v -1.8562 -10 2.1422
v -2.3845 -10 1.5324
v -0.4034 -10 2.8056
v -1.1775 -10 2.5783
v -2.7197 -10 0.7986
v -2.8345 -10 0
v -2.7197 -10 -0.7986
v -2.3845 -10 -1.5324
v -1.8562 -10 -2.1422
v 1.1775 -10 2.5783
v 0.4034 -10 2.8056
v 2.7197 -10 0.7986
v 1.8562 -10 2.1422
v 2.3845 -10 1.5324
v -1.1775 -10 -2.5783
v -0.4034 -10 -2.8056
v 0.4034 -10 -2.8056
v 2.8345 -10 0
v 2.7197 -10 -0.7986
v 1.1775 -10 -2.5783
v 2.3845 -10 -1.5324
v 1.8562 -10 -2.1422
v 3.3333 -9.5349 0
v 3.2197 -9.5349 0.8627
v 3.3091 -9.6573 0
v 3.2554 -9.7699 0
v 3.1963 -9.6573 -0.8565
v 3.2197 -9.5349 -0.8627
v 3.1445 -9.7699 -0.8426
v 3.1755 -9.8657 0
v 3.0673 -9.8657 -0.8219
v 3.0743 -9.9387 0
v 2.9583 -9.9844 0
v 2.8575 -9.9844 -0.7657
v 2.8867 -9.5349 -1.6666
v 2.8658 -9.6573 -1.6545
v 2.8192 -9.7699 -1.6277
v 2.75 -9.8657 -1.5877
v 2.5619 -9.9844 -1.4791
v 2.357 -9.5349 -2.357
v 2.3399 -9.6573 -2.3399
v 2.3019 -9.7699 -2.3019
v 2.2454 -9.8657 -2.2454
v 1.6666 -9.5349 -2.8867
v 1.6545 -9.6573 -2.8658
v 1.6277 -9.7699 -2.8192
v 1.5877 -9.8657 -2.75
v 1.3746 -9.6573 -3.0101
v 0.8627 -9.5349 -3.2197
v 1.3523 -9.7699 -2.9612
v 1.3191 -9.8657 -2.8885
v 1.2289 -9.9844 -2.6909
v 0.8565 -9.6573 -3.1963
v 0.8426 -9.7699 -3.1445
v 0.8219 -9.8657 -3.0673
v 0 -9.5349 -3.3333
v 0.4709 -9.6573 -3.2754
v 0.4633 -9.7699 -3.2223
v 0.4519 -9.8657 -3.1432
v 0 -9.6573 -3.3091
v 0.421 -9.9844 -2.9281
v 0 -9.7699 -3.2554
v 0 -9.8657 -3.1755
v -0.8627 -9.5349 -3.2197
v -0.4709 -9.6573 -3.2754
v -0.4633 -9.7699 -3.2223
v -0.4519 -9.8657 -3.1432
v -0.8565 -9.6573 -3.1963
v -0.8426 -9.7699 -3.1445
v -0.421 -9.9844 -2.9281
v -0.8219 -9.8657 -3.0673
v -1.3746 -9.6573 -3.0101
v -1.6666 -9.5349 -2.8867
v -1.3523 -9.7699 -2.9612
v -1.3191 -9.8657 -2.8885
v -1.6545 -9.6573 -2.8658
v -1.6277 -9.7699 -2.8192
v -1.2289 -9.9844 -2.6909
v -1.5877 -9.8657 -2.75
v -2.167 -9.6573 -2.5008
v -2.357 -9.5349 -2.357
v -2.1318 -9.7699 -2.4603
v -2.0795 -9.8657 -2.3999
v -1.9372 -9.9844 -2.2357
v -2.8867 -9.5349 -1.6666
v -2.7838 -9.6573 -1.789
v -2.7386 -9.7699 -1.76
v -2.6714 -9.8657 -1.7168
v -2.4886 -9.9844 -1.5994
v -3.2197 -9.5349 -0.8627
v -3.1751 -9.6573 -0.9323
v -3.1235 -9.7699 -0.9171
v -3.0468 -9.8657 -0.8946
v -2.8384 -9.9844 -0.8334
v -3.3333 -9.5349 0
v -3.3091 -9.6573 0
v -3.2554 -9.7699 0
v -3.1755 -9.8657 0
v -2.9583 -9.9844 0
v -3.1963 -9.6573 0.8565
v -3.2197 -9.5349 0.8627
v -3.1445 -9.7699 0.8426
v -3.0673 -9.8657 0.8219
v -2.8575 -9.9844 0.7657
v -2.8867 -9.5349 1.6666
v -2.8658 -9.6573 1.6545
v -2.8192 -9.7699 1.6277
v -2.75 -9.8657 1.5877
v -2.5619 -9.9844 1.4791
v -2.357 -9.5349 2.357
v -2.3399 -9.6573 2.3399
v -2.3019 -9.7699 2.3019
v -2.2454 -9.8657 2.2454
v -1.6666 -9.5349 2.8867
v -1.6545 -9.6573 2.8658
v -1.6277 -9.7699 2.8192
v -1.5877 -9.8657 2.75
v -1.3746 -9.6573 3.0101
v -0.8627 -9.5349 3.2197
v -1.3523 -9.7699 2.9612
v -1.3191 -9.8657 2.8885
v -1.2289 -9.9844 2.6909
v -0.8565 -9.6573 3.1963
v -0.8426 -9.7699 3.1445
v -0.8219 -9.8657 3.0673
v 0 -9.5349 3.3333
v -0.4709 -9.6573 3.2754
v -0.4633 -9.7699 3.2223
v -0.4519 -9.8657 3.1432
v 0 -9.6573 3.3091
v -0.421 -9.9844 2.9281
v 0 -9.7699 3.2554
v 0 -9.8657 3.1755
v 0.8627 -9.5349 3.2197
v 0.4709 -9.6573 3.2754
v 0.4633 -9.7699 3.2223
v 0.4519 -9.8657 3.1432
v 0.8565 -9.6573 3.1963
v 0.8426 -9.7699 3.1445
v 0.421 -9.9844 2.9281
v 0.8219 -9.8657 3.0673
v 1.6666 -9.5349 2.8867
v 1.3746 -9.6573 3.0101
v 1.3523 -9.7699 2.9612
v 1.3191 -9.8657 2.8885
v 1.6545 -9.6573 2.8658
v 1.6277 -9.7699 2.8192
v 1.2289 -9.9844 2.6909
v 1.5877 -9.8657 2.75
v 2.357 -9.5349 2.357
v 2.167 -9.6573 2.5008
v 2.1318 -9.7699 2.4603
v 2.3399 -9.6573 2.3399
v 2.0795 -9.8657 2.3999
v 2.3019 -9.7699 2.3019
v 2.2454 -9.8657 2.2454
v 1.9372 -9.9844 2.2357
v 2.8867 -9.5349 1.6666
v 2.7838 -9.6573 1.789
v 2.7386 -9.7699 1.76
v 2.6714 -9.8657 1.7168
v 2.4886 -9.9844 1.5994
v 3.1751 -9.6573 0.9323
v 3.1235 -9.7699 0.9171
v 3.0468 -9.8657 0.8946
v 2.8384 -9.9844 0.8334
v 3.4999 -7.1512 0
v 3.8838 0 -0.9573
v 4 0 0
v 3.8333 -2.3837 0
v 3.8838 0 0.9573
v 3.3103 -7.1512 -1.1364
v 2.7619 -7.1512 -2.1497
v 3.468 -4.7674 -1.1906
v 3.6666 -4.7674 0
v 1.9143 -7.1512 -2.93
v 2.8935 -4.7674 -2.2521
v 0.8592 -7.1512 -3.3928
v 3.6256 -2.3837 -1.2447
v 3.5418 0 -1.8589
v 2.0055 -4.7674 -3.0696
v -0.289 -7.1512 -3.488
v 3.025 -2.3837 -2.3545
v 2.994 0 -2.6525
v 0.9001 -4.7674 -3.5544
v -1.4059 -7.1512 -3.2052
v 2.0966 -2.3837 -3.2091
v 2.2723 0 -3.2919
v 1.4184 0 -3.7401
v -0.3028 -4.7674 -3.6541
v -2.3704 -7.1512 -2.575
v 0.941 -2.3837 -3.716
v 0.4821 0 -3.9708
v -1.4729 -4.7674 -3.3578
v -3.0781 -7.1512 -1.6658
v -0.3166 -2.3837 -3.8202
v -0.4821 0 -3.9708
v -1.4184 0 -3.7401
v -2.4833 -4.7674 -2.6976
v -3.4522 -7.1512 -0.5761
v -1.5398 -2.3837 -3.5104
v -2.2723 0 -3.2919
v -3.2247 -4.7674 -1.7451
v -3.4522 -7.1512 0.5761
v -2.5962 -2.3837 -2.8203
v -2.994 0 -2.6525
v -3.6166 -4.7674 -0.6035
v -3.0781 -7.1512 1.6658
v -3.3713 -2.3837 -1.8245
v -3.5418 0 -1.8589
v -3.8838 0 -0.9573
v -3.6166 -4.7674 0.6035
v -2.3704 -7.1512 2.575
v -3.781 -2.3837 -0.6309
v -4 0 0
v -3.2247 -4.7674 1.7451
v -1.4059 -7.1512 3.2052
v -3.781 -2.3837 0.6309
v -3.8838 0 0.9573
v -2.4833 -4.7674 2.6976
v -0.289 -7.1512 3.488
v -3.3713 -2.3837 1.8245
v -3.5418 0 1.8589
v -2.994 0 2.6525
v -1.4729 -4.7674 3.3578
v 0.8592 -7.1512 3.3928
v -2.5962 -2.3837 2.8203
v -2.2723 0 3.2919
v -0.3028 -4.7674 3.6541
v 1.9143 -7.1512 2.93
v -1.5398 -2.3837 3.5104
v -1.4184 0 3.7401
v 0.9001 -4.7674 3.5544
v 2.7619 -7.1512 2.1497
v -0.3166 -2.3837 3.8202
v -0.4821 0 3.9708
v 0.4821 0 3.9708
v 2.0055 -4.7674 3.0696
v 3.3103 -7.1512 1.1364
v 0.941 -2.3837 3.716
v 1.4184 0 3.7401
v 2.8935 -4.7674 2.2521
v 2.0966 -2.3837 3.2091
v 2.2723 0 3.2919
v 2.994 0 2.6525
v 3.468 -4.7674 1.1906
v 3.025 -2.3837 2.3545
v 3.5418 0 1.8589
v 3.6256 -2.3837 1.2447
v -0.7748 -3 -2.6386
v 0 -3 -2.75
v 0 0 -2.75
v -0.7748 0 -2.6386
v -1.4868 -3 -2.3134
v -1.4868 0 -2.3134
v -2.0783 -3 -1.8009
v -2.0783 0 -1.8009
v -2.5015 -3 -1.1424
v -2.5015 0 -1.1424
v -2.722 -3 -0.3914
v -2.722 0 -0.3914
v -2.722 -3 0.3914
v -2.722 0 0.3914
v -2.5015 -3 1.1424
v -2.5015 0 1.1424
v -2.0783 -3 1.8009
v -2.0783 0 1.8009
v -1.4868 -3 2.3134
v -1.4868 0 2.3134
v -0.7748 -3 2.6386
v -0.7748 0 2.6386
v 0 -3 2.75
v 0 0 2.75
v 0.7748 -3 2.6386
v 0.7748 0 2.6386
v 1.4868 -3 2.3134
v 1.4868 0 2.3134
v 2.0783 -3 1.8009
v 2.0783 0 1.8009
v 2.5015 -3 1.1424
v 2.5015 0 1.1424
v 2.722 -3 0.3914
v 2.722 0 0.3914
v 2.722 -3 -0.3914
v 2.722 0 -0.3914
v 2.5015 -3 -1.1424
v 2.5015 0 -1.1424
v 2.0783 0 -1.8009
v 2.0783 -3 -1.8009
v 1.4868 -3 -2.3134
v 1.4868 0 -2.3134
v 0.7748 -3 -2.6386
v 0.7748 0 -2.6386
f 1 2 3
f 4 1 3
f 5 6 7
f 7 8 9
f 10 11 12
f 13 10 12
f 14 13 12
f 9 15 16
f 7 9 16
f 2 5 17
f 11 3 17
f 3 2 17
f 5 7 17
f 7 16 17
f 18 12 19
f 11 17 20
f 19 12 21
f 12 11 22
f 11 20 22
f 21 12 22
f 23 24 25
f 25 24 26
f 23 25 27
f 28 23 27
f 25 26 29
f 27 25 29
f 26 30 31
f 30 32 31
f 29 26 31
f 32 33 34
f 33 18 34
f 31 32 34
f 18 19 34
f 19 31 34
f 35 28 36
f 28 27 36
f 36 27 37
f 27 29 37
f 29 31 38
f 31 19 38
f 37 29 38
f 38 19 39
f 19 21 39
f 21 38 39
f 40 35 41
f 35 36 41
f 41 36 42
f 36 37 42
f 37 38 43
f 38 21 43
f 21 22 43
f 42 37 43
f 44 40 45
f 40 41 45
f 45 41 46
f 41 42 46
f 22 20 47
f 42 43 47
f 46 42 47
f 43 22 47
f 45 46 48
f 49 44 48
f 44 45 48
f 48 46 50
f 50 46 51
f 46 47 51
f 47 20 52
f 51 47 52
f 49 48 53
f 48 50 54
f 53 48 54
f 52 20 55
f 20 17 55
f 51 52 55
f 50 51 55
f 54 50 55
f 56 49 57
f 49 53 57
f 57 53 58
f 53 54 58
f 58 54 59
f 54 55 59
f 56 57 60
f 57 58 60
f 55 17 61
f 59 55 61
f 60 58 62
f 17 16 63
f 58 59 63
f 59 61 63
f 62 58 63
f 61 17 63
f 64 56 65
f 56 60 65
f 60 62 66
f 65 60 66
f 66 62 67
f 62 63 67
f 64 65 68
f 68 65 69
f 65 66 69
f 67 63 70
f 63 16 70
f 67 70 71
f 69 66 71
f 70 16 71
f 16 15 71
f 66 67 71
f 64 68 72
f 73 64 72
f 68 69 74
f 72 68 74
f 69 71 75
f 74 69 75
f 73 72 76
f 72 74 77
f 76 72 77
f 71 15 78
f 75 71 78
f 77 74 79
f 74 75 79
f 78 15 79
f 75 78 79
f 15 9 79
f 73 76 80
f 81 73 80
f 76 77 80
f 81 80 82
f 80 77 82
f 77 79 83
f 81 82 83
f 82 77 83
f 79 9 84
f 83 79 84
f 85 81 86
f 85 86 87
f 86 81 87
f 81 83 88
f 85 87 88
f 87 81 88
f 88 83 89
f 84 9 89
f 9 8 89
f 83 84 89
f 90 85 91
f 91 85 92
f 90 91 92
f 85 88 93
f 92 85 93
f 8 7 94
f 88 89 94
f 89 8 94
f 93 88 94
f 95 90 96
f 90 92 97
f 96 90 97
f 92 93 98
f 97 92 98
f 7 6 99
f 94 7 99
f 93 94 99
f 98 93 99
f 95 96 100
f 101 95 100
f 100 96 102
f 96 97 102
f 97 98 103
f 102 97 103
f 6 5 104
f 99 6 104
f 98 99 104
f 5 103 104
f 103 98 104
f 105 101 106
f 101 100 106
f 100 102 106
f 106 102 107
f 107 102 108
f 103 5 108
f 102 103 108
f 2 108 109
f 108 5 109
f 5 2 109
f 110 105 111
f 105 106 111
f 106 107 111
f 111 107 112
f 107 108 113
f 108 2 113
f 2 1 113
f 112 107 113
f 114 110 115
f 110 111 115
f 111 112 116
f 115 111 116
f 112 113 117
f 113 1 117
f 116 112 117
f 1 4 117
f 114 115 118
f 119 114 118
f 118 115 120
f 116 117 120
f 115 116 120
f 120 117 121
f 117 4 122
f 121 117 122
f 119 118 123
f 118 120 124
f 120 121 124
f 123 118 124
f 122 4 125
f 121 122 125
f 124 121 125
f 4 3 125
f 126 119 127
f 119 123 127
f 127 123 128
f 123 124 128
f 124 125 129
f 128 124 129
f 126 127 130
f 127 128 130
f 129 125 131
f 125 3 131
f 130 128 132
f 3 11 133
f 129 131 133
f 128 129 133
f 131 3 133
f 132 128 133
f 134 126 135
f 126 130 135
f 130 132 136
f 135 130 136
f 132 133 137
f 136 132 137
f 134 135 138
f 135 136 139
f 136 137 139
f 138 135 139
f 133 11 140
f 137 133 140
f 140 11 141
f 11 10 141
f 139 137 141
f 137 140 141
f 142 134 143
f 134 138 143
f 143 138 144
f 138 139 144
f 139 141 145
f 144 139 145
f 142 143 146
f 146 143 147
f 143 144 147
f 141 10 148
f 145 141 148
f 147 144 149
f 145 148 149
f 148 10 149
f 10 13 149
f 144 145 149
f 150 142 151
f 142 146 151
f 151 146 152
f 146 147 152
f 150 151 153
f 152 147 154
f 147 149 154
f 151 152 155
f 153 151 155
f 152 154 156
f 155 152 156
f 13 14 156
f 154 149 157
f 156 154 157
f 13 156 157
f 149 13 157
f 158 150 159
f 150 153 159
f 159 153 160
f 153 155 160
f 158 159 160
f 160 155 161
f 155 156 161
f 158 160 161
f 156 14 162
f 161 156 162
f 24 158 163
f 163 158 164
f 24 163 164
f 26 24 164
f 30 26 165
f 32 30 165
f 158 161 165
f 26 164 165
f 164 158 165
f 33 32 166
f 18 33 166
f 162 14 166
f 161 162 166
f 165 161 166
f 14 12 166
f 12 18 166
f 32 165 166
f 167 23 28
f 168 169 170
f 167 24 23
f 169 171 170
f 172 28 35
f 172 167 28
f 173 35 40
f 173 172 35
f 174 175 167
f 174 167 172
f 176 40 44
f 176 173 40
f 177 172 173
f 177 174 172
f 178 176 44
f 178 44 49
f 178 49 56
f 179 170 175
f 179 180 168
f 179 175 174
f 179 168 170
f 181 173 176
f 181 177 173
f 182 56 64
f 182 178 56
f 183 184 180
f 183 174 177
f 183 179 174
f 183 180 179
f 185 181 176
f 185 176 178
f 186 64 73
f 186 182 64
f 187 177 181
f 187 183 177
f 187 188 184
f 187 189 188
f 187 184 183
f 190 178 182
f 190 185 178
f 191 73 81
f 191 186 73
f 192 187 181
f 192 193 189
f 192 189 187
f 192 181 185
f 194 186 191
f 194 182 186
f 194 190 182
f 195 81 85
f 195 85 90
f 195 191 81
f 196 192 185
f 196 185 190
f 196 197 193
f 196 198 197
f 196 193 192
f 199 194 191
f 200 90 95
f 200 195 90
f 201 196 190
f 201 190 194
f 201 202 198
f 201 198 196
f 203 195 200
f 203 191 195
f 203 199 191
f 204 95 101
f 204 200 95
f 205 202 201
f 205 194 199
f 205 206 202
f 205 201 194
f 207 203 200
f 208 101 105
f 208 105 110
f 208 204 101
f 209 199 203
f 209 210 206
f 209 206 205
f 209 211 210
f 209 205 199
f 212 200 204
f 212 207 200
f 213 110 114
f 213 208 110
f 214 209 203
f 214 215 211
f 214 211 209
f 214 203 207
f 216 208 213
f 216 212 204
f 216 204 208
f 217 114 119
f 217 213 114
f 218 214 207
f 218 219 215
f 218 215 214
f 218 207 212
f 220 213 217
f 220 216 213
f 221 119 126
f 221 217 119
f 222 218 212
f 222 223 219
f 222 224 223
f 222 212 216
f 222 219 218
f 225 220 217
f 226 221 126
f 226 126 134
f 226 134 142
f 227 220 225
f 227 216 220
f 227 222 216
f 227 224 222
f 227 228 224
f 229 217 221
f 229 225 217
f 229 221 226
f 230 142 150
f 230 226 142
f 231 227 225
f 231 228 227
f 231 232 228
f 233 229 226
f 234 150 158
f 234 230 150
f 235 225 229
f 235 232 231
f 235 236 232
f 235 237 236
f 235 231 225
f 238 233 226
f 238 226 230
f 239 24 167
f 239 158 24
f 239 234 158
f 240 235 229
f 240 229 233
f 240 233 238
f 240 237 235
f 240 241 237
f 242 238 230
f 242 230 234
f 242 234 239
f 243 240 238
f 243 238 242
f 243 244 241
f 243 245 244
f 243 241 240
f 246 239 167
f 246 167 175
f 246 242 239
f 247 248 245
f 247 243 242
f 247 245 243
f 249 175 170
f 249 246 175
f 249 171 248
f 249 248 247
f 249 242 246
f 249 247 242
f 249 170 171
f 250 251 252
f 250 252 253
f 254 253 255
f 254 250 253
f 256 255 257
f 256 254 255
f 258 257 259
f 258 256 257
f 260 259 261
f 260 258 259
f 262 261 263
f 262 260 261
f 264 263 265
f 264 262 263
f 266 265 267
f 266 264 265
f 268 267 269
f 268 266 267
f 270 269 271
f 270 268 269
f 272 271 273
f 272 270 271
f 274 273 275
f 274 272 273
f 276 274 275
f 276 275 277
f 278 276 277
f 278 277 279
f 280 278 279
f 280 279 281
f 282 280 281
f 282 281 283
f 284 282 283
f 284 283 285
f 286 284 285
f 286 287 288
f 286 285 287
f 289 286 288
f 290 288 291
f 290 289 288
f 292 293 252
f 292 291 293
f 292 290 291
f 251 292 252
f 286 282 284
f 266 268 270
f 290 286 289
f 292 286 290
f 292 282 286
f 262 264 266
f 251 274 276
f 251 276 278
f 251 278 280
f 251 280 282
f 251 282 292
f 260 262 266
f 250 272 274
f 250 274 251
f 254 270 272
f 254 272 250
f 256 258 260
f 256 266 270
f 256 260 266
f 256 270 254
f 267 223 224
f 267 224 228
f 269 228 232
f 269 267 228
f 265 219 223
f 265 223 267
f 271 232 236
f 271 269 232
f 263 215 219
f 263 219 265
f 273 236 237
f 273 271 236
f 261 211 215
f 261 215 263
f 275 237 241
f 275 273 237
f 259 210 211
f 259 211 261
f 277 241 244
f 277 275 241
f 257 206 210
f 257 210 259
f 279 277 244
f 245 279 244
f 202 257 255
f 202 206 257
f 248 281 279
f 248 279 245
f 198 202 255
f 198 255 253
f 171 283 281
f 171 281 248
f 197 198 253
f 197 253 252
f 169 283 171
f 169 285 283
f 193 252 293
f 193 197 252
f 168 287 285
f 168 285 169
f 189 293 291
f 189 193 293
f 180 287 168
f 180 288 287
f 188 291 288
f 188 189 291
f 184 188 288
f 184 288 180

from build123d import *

# Parameters (mm, degrees)
SKETCH1_R               = 4
BOSS_EXTRUDE1_DEPTH     = 10
BOSS_EXTRUDE1_DRAFT     = -4
SKETCH2_R               = 2.75
BOSS_EXTRUDE2_DEPTH     = 3
CUT_EXTRUDE1_DEPTH      = 12.489125293
CUT_EXTRUDE1_DEPTH_BACK = 3
SKETCH2_3_R             = 2.75
FILLET1_R               = 0.5


with BuildPart() as part:
    # Sketch1 → Boss-Extrude1 (with draft: the straight prism first)
    with BuildSketch(Plane(origin=(0, 0, 0), x_dir=(1, 0, 0), z_dir=(0, 1, 0))):
        Circle(SKETCH1_R)
    extrude(amount=-BOSS_EXTRUDE1_DEPTH)
    # Boss-Extrude1: the draft: its side faces are tilted about the plane it starts from
    boss_extrude1_sides = [part.faces().sort_by_distance(p)[0] for p in [
        (-4, -5, 0),
    ]]
    draft(boss_extrude1_sides, Plane(origin=(0, 0, 0), x_dir=(1, 0, 0), z_dir=(0, 1, 0)), BOSS_EXTRUDE1_DRAFT)

    # Sketch2 → Boss-Extrude2 (add)
    with BuildSketch(Plane(origin=(0, 0, 0), x_dir=(1, 0, 0), z_dir=(0, 1, 0))):
        Circle(SKETCH2_R)
    extrude(amount=-BOSS_EXTRUDE2_DEPTH)

    # Sketch2<3> → Cut-Extrude1 (cut, two sides: drawn at the far end of the back side and taken through both)
    with BuildSketch(Plane(origin=(0, 0, 0), x_dir=(1, 0, 0), z_dir=(0, 1, 0)).offset(-CUT_EXTRUDE1_DEPTH_BACK)):
        Circle(SKETCH2_3_R)
    extrude(amount=CUT_EXTRUDE1_DEPTH + CUT_EXTRUDE1_DEPTH_BACK, mode=Mode.SUBTRACT)

    # Fillet1
    fillet1_edges = [part.edges().sort_by_distance(p)[0] for p in [
        (-3.300731881, -10, 0),
    ]]
    fillet(fillet1_edges, radius=FILLET1_R)


solid = part.part
